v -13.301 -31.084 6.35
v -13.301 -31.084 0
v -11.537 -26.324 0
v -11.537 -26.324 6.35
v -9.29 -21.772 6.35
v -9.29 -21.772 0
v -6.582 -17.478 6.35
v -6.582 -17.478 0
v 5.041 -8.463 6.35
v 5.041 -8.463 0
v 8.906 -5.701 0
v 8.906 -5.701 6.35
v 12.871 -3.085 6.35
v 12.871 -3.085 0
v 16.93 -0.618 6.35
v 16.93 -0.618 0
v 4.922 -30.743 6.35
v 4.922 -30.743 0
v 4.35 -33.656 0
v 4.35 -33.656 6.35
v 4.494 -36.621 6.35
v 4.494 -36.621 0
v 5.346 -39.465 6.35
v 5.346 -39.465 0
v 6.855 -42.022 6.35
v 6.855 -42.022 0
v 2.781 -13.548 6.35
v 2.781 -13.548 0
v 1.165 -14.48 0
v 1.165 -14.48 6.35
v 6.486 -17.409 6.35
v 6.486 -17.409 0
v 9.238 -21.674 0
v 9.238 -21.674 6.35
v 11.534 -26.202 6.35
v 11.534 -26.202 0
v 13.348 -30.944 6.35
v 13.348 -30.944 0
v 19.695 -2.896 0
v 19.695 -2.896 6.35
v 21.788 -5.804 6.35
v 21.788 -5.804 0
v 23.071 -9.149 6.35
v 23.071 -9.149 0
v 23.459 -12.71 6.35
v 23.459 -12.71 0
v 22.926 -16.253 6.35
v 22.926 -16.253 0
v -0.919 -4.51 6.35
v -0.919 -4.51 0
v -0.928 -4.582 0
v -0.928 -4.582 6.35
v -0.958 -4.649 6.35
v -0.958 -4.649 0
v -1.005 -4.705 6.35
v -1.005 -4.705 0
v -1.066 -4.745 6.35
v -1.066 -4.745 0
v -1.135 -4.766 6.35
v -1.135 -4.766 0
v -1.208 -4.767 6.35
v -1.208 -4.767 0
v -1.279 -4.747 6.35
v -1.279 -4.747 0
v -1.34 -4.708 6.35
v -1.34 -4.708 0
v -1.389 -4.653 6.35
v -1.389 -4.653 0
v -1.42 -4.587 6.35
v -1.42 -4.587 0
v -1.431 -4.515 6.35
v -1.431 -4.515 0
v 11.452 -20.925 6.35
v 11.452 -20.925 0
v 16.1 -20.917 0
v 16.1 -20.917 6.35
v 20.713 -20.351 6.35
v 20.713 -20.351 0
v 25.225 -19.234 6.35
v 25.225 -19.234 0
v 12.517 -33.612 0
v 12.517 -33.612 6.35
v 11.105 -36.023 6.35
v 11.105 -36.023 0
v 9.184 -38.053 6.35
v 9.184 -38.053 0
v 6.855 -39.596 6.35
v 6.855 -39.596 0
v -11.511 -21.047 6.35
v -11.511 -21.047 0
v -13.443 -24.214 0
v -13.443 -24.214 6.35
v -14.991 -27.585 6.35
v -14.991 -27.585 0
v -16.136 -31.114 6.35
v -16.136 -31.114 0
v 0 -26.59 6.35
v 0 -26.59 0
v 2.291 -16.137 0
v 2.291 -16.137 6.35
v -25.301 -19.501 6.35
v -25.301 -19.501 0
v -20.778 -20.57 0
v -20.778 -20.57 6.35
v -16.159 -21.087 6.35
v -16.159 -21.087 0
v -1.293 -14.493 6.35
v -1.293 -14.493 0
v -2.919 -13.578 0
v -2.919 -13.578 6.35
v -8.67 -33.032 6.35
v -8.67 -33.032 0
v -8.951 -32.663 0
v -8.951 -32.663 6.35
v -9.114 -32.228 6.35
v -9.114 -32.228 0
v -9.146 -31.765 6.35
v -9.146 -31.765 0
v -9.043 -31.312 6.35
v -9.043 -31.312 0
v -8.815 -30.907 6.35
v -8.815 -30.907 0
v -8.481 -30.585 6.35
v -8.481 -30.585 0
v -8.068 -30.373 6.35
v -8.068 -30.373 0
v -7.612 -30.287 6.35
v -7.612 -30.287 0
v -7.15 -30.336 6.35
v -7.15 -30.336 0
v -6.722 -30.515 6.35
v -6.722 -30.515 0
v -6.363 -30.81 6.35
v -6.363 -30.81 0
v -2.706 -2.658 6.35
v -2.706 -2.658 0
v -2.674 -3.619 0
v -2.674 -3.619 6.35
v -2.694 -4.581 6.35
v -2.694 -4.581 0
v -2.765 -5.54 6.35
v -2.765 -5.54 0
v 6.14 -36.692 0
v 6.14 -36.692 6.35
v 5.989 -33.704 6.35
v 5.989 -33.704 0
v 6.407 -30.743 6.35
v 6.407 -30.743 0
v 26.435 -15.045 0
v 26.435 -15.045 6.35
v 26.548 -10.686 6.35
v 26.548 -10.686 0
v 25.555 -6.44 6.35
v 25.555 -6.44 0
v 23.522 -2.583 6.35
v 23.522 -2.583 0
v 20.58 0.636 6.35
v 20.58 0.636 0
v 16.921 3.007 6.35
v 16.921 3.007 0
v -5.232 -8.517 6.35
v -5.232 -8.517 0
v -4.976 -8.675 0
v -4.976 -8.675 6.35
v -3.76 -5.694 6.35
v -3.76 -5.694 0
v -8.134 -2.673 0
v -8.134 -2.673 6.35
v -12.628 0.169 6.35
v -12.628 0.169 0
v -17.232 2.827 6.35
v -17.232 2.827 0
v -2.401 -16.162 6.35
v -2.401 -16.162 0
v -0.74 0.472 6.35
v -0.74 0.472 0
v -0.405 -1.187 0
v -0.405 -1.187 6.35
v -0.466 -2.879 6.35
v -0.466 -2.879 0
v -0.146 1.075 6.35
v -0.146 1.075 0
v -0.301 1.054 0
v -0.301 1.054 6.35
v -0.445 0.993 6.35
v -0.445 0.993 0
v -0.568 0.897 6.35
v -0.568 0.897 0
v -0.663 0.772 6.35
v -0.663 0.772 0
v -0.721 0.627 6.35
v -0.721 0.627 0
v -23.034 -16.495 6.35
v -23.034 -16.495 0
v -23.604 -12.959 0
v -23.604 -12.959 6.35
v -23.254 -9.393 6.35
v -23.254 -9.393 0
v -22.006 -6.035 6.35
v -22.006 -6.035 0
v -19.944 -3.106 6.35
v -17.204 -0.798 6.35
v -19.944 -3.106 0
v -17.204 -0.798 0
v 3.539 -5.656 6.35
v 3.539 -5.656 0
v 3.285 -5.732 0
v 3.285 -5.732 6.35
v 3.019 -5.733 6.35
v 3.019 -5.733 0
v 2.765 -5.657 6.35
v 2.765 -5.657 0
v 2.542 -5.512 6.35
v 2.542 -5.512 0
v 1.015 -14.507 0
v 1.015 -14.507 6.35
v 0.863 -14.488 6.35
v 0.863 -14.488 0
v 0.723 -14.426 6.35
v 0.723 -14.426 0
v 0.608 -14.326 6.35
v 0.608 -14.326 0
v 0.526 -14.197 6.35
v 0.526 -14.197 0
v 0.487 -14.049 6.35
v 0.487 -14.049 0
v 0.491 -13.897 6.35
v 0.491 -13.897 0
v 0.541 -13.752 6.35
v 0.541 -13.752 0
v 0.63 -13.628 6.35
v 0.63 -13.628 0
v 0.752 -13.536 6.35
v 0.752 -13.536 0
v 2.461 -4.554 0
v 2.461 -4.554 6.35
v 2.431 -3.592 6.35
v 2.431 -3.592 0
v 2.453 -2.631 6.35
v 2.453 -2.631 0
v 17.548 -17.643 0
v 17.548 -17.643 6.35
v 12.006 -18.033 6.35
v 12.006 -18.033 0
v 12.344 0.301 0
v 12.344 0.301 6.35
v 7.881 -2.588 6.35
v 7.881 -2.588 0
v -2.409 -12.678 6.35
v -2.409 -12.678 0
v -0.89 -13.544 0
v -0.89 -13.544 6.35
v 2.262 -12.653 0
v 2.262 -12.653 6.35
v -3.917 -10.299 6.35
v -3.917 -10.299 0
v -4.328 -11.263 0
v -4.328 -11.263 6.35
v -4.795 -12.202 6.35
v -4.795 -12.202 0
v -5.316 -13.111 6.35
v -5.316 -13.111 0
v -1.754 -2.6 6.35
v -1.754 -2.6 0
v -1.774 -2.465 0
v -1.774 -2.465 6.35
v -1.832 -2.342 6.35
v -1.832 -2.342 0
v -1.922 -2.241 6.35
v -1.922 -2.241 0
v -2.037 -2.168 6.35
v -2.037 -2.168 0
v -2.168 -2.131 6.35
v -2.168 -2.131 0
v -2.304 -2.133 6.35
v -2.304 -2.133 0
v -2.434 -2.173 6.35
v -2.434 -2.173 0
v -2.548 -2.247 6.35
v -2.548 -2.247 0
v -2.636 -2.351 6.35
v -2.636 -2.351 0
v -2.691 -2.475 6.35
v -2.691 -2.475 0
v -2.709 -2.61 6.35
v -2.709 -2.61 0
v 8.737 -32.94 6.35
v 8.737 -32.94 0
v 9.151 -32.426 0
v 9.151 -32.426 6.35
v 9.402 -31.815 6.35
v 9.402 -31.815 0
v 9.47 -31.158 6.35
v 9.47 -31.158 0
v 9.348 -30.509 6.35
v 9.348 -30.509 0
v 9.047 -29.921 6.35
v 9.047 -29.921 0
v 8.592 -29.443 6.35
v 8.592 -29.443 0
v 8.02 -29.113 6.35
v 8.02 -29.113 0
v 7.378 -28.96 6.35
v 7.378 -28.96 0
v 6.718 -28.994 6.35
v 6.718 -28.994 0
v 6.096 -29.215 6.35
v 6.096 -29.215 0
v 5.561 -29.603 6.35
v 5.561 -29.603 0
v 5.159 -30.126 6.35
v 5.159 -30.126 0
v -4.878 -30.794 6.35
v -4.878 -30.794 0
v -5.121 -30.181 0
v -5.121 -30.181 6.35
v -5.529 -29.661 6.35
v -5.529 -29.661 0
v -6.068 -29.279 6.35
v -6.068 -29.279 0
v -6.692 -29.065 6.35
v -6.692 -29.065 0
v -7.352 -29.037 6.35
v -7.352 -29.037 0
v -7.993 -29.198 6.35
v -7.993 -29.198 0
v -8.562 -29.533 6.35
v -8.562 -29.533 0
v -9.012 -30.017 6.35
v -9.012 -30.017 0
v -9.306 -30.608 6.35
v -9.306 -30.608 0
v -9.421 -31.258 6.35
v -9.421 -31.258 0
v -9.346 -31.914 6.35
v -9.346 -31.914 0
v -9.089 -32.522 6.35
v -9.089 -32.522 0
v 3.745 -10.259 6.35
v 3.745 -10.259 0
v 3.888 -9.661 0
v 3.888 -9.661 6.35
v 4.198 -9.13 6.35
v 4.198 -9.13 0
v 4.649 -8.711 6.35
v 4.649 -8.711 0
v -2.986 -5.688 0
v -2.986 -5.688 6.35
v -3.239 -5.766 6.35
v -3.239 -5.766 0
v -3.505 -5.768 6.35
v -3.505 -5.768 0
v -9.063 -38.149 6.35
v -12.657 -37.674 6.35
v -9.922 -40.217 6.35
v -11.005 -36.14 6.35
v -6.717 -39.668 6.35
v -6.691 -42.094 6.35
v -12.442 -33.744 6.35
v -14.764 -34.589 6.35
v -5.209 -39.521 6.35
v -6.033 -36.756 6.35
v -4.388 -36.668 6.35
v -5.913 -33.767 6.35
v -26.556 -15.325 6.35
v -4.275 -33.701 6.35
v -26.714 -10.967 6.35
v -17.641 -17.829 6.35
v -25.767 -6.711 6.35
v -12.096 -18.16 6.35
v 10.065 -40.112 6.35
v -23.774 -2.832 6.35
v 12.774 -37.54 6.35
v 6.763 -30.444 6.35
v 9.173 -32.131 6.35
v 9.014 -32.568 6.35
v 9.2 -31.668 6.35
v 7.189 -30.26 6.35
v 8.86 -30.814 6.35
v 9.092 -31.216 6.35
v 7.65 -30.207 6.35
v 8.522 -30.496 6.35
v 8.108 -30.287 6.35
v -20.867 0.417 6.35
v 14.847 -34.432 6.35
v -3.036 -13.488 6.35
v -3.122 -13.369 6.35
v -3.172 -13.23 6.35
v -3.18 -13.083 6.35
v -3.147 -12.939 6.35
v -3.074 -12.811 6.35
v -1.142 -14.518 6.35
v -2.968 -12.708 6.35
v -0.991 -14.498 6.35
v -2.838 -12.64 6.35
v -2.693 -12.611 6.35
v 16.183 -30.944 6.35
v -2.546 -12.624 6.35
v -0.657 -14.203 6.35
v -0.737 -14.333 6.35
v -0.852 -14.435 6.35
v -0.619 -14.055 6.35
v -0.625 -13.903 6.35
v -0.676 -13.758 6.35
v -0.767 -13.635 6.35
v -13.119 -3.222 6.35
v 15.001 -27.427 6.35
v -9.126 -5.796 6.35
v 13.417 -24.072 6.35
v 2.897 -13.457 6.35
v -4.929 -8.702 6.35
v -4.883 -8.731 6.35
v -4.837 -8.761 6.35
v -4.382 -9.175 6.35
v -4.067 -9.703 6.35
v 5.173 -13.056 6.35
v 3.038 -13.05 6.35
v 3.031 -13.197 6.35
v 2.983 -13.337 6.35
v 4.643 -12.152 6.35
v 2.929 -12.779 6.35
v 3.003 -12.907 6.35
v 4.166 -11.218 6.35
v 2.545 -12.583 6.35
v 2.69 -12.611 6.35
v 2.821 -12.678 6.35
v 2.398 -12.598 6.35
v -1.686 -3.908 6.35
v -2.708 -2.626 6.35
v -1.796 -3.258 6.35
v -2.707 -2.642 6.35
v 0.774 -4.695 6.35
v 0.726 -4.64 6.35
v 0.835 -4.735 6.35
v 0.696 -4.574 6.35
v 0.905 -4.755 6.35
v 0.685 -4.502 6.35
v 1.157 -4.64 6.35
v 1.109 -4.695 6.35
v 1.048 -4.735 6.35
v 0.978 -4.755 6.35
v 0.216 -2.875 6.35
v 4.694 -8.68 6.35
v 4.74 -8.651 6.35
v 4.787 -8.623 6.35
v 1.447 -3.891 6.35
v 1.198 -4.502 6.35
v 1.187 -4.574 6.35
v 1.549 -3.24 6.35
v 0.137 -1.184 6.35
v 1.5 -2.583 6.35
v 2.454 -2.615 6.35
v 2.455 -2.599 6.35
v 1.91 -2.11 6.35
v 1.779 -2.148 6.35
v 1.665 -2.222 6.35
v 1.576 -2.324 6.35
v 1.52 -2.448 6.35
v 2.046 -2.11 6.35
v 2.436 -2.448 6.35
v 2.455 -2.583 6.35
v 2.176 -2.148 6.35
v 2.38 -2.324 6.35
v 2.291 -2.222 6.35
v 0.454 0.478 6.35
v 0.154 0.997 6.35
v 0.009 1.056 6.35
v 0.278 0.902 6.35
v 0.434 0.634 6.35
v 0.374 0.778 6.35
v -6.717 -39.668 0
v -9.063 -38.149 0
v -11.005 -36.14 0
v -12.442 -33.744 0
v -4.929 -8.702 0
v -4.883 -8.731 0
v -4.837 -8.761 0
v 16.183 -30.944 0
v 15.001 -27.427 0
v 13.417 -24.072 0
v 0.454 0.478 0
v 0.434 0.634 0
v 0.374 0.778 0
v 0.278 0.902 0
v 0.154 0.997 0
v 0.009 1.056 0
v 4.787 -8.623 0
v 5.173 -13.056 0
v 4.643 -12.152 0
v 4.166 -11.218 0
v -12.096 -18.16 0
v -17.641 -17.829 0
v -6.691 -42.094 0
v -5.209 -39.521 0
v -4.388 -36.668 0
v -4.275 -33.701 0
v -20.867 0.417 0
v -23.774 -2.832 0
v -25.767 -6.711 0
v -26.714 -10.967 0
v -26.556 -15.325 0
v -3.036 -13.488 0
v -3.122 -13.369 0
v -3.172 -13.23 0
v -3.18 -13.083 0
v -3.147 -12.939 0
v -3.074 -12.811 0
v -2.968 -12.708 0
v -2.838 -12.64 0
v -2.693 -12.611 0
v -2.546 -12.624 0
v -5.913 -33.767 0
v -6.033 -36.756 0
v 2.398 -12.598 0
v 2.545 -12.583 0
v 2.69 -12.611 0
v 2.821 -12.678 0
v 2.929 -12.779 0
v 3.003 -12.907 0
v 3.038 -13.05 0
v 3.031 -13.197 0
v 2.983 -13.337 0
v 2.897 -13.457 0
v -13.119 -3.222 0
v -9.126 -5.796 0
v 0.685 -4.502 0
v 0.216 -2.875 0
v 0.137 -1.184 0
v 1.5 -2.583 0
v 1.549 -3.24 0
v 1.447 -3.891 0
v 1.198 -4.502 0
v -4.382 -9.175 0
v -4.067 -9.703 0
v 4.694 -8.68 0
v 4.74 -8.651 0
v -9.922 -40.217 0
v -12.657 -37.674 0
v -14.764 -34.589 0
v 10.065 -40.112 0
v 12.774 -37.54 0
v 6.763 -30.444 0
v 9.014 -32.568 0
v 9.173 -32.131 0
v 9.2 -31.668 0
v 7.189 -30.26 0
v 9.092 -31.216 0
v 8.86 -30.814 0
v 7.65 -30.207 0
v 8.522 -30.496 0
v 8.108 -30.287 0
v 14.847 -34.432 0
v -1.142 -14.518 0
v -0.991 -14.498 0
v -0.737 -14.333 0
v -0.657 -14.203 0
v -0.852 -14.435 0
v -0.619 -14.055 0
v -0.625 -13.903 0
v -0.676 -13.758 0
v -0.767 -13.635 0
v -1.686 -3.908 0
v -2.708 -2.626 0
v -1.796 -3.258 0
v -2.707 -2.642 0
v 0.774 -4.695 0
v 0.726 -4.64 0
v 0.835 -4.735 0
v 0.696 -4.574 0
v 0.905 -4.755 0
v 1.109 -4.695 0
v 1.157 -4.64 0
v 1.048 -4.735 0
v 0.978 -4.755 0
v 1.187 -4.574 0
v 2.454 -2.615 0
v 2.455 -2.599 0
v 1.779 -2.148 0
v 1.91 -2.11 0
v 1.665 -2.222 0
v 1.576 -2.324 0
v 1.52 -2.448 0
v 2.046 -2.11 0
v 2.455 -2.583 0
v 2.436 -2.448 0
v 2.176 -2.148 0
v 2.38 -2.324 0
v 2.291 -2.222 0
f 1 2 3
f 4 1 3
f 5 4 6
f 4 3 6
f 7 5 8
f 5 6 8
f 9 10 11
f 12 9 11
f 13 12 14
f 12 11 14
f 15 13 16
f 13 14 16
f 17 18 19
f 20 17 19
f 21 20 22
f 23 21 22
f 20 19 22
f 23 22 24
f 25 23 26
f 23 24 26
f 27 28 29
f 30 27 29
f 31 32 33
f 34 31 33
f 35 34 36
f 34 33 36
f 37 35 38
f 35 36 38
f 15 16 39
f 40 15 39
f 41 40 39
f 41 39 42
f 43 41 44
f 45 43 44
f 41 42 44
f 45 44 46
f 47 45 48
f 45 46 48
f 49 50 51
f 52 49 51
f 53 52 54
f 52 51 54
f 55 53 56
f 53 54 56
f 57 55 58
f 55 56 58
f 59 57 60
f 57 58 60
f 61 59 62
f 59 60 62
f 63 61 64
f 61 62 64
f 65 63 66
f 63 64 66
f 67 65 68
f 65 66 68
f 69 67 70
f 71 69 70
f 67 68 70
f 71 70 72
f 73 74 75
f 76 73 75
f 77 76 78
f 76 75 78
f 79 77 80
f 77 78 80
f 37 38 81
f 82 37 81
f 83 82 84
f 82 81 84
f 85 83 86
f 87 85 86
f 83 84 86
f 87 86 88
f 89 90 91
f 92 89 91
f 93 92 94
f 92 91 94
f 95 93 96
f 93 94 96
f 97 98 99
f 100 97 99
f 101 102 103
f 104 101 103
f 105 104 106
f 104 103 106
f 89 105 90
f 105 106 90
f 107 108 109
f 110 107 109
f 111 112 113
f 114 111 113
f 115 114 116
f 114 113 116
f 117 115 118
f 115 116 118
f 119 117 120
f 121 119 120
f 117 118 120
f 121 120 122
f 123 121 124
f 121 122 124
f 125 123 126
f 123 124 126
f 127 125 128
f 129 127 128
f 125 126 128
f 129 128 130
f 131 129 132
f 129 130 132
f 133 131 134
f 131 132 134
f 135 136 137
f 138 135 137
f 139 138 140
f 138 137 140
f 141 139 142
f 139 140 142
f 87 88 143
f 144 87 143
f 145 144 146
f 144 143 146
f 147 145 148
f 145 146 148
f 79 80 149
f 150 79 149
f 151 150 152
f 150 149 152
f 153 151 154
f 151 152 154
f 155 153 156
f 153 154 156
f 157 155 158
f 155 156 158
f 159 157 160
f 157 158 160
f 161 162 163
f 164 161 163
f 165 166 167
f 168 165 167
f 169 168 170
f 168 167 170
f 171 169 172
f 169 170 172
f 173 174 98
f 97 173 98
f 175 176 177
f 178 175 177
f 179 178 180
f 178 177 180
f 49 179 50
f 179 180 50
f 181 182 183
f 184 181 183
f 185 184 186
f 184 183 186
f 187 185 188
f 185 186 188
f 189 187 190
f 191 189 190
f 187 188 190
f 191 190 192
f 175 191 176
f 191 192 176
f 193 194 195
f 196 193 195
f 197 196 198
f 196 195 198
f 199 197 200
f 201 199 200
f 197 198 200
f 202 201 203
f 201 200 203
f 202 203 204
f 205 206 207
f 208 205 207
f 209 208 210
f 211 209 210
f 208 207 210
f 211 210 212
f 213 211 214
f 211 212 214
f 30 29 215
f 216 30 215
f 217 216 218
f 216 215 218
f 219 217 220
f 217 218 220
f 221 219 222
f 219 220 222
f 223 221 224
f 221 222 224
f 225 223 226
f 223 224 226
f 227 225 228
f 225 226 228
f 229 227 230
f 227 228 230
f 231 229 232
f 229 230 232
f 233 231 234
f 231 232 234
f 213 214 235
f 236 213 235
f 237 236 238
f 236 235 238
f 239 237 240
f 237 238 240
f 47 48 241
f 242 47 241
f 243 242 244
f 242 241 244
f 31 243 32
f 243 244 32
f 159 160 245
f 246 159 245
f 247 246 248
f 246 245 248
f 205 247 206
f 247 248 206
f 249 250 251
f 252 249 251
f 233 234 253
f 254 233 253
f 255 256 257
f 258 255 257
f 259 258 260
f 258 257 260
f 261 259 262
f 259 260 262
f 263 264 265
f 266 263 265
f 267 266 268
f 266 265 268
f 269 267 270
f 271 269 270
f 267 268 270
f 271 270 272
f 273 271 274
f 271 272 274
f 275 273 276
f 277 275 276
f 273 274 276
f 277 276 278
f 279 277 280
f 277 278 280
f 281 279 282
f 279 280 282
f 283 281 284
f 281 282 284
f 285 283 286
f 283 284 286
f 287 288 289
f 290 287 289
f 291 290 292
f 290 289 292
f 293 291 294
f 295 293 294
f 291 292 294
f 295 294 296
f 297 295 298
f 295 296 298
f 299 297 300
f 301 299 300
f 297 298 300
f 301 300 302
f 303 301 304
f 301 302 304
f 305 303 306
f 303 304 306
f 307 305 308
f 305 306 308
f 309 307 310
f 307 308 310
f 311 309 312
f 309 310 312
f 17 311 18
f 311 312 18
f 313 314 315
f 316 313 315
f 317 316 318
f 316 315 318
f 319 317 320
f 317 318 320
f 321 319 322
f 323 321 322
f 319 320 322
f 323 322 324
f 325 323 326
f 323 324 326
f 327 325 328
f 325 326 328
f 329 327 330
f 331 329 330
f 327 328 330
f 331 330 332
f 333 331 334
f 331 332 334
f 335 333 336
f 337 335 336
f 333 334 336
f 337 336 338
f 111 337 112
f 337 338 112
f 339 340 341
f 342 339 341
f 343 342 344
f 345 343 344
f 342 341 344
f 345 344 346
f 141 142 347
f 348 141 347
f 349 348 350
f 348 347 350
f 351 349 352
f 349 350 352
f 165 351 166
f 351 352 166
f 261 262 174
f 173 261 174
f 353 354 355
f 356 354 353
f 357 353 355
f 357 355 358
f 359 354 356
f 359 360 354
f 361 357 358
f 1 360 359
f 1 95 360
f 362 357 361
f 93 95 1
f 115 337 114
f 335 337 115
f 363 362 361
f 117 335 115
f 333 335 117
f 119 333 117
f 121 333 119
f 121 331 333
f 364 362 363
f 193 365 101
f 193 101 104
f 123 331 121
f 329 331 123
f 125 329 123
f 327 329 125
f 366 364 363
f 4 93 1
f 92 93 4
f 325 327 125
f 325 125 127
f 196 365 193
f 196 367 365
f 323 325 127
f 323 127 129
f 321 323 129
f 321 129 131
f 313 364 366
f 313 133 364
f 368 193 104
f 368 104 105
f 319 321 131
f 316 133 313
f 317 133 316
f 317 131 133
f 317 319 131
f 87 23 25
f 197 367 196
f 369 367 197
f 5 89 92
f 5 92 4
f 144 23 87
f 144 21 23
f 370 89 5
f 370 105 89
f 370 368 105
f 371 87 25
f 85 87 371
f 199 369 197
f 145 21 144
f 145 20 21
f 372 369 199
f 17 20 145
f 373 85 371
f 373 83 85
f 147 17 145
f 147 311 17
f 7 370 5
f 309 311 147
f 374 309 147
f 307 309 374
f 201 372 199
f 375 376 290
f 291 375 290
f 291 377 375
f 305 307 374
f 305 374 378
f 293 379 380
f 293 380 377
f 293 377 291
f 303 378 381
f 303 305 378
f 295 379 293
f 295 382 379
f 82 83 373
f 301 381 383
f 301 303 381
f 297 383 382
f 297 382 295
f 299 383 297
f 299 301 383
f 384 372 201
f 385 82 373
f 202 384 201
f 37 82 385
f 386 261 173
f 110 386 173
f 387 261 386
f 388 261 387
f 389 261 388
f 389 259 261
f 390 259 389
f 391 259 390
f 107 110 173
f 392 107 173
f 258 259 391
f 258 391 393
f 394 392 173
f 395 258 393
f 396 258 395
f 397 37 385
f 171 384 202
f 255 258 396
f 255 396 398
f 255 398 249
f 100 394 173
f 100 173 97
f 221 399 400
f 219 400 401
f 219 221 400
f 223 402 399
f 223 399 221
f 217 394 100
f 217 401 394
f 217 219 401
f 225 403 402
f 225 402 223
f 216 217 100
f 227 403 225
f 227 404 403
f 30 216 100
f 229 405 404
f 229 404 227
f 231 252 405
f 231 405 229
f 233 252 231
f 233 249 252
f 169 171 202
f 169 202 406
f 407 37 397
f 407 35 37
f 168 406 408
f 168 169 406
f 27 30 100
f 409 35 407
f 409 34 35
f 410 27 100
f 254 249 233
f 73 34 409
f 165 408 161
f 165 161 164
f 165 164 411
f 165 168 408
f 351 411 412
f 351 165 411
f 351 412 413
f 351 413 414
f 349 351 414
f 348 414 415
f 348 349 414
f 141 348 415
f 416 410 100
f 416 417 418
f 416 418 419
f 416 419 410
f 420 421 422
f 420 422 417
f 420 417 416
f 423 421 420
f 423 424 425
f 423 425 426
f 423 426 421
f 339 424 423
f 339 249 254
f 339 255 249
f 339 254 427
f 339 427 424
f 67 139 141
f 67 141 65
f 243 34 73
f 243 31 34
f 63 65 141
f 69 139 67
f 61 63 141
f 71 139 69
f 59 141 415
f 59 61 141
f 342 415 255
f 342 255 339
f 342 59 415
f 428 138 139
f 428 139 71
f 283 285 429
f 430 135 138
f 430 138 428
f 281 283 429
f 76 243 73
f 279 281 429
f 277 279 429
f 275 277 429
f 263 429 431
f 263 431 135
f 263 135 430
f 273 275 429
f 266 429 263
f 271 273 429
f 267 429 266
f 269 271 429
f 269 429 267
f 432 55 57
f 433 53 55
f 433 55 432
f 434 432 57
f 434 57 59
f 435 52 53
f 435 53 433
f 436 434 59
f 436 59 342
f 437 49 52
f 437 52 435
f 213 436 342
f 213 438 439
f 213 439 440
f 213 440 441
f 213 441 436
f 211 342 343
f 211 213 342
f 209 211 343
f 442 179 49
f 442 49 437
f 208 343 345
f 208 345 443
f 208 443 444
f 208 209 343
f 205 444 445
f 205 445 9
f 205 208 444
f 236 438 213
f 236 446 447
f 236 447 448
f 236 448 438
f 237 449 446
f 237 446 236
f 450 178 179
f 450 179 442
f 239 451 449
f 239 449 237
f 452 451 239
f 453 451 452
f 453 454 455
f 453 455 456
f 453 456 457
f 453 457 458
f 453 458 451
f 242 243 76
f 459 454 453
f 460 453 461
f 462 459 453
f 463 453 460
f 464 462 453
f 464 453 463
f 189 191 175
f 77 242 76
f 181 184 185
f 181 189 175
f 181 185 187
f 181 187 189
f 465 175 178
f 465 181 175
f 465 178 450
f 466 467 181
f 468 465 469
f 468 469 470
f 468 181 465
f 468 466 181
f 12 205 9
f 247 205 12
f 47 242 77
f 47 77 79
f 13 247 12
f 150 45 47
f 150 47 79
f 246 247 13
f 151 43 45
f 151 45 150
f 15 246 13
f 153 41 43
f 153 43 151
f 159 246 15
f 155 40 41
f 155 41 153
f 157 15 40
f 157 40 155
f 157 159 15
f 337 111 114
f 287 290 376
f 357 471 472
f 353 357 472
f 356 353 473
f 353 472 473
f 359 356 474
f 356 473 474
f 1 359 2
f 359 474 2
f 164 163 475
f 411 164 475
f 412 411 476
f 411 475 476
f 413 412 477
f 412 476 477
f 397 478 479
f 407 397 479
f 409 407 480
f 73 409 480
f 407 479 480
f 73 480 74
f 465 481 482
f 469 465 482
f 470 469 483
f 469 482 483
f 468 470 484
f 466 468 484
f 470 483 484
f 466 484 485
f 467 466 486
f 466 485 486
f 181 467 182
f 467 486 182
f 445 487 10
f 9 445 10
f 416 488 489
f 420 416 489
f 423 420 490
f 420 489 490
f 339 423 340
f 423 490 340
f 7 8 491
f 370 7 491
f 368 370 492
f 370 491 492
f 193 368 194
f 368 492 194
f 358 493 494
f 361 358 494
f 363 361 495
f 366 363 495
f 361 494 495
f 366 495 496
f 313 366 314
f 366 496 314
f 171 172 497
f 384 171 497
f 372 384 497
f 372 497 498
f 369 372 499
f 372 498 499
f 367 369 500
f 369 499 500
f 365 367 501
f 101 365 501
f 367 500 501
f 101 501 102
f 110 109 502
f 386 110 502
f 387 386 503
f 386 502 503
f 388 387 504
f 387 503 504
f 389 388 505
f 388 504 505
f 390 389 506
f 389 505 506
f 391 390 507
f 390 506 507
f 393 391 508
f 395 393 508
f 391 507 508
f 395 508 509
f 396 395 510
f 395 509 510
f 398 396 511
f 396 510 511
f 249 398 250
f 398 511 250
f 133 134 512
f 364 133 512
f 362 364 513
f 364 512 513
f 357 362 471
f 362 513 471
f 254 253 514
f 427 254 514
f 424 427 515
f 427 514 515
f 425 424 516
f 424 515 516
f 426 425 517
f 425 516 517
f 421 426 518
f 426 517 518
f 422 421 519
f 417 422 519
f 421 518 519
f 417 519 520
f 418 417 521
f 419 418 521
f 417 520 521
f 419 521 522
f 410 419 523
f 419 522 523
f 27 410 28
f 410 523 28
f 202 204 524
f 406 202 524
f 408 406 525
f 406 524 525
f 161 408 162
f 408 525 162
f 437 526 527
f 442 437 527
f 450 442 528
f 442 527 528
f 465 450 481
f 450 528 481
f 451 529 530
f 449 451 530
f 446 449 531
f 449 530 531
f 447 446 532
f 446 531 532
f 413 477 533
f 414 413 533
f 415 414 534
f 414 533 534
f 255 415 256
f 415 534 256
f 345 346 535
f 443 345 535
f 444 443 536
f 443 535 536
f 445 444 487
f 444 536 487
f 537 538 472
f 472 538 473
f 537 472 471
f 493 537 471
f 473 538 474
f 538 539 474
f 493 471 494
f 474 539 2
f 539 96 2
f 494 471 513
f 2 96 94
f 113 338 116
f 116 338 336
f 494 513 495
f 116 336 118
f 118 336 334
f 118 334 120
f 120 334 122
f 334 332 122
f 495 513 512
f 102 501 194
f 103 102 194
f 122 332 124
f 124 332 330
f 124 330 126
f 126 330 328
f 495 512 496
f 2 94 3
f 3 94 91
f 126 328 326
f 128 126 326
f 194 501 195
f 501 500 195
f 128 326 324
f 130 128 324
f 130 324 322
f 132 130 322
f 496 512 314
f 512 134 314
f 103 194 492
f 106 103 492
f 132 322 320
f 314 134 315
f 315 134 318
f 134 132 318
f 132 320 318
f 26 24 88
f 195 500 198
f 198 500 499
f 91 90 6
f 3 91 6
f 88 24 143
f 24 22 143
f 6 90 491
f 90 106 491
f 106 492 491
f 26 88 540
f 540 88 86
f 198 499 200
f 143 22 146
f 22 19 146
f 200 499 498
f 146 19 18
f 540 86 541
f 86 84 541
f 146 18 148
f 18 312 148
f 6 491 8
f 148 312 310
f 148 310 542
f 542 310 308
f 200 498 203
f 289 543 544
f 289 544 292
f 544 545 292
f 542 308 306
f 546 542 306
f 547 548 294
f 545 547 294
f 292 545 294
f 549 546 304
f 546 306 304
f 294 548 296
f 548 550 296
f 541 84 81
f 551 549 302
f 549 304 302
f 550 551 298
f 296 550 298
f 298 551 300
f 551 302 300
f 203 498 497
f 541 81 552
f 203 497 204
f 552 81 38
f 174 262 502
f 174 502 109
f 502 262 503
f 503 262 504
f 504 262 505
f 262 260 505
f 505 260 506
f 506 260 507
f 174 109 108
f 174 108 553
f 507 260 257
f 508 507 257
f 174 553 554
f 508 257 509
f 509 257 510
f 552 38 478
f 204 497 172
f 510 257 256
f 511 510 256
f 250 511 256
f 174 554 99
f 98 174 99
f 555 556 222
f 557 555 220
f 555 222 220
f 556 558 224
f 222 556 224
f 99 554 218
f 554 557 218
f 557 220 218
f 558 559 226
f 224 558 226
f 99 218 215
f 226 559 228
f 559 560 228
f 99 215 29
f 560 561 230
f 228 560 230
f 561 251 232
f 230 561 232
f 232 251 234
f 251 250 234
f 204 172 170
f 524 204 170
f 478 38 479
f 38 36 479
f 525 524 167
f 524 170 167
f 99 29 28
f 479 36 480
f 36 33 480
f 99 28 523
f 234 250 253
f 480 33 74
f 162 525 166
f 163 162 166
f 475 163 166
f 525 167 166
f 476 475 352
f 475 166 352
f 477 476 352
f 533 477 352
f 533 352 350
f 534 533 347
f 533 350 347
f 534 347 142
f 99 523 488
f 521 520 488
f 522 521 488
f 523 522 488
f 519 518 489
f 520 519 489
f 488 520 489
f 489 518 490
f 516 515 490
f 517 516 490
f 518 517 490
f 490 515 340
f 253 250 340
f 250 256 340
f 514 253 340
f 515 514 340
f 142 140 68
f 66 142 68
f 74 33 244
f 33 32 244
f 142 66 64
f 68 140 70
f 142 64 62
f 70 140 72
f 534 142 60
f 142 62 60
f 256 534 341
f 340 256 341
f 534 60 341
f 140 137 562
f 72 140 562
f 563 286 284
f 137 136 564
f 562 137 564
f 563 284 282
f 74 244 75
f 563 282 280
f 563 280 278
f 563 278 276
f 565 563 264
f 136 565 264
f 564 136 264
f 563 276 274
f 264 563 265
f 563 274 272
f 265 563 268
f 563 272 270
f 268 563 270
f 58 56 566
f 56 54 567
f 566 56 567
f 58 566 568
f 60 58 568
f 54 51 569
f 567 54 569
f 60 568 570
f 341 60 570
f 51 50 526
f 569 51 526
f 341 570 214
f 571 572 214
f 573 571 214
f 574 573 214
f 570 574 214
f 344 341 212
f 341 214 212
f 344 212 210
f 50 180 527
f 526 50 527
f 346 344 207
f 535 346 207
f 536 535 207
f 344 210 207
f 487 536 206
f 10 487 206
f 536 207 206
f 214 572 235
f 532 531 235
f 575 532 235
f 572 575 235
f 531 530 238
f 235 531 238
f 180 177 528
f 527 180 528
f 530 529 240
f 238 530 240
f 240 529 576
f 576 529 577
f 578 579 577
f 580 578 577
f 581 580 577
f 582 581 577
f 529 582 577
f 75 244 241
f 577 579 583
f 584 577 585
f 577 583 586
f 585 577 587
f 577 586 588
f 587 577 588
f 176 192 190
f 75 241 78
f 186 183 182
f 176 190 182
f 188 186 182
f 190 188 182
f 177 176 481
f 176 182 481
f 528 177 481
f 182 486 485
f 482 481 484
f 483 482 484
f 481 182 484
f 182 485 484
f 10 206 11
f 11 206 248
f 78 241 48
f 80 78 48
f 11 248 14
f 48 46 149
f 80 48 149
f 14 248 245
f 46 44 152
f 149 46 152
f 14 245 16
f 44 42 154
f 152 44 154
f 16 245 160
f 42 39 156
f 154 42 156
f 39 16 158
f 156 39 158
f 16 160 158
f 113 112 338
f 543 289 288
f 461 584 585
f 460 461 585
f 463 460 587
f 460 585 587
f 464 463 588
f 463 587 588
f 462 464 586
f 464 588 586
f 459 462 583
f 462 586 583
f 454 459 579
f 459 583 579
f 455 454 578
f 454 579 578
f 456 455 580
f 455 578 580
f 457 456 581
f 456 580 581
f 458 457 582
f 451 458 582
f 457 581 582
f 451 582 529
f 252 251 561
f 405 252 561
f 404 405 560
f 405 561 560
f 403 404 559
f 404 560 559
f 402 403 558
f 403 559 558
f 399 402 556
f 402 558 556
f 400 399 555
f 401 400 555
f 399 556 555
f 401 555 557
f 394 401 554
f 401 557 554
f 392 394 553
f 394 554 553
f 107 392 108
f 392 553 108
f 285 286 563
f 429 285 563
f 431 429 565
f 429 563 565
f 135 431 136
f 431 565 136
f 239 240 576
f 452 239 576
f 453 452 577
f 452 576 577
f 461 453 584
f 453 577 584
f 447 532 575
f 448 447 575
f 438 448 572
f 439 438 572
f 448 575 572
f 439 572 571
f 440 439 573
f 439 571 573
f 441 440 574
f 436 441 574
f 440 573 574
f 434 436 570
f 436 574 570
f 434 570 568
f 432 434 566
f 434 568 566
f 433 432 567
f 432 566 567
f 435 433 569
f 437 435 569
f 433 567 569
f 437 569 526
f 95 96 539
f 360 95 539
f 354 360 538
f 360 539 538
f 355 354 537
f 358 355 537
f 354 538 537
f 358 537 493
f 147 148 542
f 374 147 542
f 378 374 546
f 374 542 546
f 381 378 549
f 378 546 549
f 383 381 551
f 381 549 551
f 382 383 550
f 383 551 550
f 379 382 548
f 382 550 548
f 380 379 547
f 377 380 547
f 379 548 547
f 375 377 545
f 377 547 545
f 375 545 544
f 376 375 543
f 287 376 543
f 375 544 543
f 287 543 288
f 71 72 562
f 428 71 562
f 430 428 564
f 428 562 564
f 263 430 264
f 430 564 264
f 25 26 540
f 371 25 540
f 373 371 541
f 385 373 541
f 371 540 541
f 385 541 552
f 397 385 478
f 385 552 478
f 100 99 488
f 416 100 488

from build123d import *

# Parameters (mm, degrees)
F1_DEPTH = 6.35


with BuildPart() as f1:
    # F0 (on Top) → F1 (new body)
    with BuildSketch(Plane.XY):
        with BuildLine():
            ThreePointArc((0.454082, 0.478478), (0.278106, 0.901741), (-0.146081, 1.07548))
            Line((-0.146081, 1.07548), (0, -26.589924))
            Line((0, -26.589924), (2.290883, -16.137376))
            Line((2.290883, -16.137376), (5.173199, -13.055723))
            ThreePointArc((5.173199, -13.055723), (4.397622, -11.688582), (3.744518, -10.25888))
            ThreePointArc((3.744518, -10.25888), (4.023673, -9.383817), (4.648638, -8.710705))
            ThreePointArc((4.648638, -8.710705), (4.716945, -8.66563), (4.78695, -8.623243))
            Line((4.78695, -8.623243), (5.040929, -8.46264))
            ThreePointArc((5.040929, -8.46264), (10.876438, -4.374773), (16.930446, -0.618068))
            ThreePointArc((16.930446, -0.618068), (22.537122, -7.43494), (22.926339, -16.252709))
            ThreePointArc((22.926339, -16.252709), (14.785708, -17.964937), (6.485587, -17.408523))
            ThreePointArc((6.485587, -17.408523), (10.444862, -23.908384), (13.347887, -30.943759))
            ThreePointArc((13.347887, -30.943759), (11.104788, -36.022973), (6.854687, -39.596003))
            ThreePointArc((6.854687, -39.596003), (5.992693, -35.201596), (6.407121, -30.742662))
            ThreePointArc((6.407121, -30.742662), (8.702961, -30.642489), (8.737067, -32.94026))
            ThreePointArc((8.737067, -32.94026), (8.317875, -29.25748), (4.921873, -30.742662))
            ThreePointArc((4.921873, -30.742662), (4.494337, -36.621274), (6.854687, -42.022163))
            ThreePointArc((6.854687, -42.022163), (12.773811, -37.539563), (16.183371, -30.943759))
            ThreePointArc((16.183371, -30.943759), (14.258029, -25.726553), (11.451863, -20.925343))
            ThreePointArc((11.451863, -20.925343), (18.414863, -20.703369), (25.22471, -19.234144))
            ThreePointArc((25.22471, -19.234144), (25.555314, -6.440003), (16.92072, 3.006856))
            ThreePointArc((16.92072, 3.006856), (10.098074, -1.120915), (3.539007, -5.655849))
            ThreePointArc((3.539007, -5.655849), (3.019272, -5.73262), (2.542413, -5.512112))
            ThreePointArc((2.542413, -5.512112), (2.439849, -4.073337), (2.453046, -2.630971))
            ThreePointArc((2.453046, -2.630971), (2.454254, -2.606818), (2.455495, -2.582667))
            ThreePointArc((2.455495, -2.582667), (1.977854, -2.105025), (1.500212, -2.582667))
            ThreePointArc((1.500212, -2.582667), (1.516702, -3.568582), (1.197531, -4.50155))
            ThreePointArc((1.197531, -4.50155), (0.94141, -4.757671), (0.685288, -4.50155))
            ThreePointArc((0.685288, -4.50155), (0.126595, -2.032107), (0.454082, 0.478478))
        make_face()
        with BuildLine():
            ThreePointArc((1.165291, -14.479887), (0.526476, -14.196909), (0.752014, -13.535627))
            Line((0.752014, -13.535627), (2.261646, -12.653382))
            ThreePointArc((2.261646, -12.653382), (2.970165, -12.840341), (2.781119, -13.548306))
            Line((2.781119, -13.548306), (1.165291, -14.479887))
        make_face(mode=Mode.SUBTRACT)
        with BuildLine():
            Line((0, -26.589924), (-0.146081, 1.07548))
            ThreePointArc((-0.146081, 1.07548), (-0.568409, 0.897272), (-0.739906, 0.472174))
            ThreePointArc((-0.739906, 0.472174), (-0.385925, -2.034813), (-0.918509, -4.510018))
            ThreePointArc((-0.918509, -4.510018), (-1.171911, -4.76883), (-1.430723, -4.515428))
            ThreePointArc((-1.430723, -4.515428), (-1.759729, -3.585882), (-1.753651, -2.599848))
            ThreePointArc((-1.753651, -2.599848), (-2.23631, -2.127277), (-2.708881, -2.609936))
            ThreePointArc((-2.708881, -2.609936), (-2.707385, -2.634073), (-2.705922, -2.658212))
            ThreePointArc((-2.705922, -2.658212), (-2.677494, -4.100358), (-2.764858, -5.540136))
            ThreePointArc((-2.764858, -5.540136), (-3.239361, -5.765667), (-3.759878, -5.694389))
            ThreePointArc((-3.759878, -5.694389), (-10.36647, -1.228974), (-17.232326, 2.826518))
            ThreePointArc((-17.232326, 2.826518), (-25.766677, -6.710997), (-25.300982, -19.500933))
            ThreePointArc((-25.300982, -19.500933), (-18.475999, -20.898162), (-11.511044, -21.046594))
            ThreePointArc((-11.511044, -21.046594), (-14.266352, -25.877169), (-16.136491, -31.114416))
            ThreePointArc((-16.136491, -31.114416), (-12.657468, -37.673847), (-6.691336, -42.09369))
            ThreePointArc((-6.691336, -42.09369), (-4.388153, -36.668176), (-4.877745, -30.794407))
            ThreePointArc((-4.877745, -30.794407), (-8.289241, -29.34517), (-8.669519, -33.032172))
            ThreePointArc((-8.669519, -33.032172), (-8.659679, -30.734169), (-6.36291, -30.810091))
            ThreePointArc((-6.36291, -30.810091), (-5.901417, -35.2644), (-6.716957, -39.667664))
            ThreePointArc((-6.716957, -39.667664), (-11.004554, -36.139716), (-13.301165, -31.084473))
            ThreePointArc((-13.301165, -31.084473), (-10.472597, -24.018834), (-6.582184, -17.477524))
            ThreePointArc((-6.582184, -17.477524), (-14.875966, -18.121559), (-23.034224, -16.495393))
            ThreePointArc((-23.034224, -16.495393), (-22.738146, -7.674005), (-17.20377, -0.798306))
            ThreePointArc((-17.20377, -0.798306), (-11.110429, -4.490869), (-5.232076, -8.516884))
            Line((-5.232076, -8.516884), (-4.976416, -8.674796))
            ThreePointArc((-4.976416, -8.674796), (-4.905966, -8.716442), (-4.837188, -8.760792))
            ThreePointArc((-4.837188, -8.760792), (-4.20515, -9.427268), (-3.916769, -10.299333))
            ThreePointArc((-3.916769, -10.299333), (-4.554739, -11.735853), (-5.315835, -13.111108))
            Line((-5.315835, -13.111108), (-2.401136, -16.162151))
            Line((-2.401136, -16.162151), (0, -26.589924))
        make_face()
        with BuildLine():
            Line((-2.408693, -12.678042), (-0.889828, -13.544297))
            ThreePointArc((-0.889828, -13.544297), (-0.657319, -14.20316), (-1.293111, -14.492868))
            Line((-1.293111, -14.492868), (-2.918687, -13.578403))
            ThreePointArc((-2.918687, -13.578403), (-3.115198, -12.872473), (-2.408693, -12.678042))
        make_face(mode=Mode.SUBTRACT)
    extrude(amount=F1_DEPTH)


solid = f1.part
